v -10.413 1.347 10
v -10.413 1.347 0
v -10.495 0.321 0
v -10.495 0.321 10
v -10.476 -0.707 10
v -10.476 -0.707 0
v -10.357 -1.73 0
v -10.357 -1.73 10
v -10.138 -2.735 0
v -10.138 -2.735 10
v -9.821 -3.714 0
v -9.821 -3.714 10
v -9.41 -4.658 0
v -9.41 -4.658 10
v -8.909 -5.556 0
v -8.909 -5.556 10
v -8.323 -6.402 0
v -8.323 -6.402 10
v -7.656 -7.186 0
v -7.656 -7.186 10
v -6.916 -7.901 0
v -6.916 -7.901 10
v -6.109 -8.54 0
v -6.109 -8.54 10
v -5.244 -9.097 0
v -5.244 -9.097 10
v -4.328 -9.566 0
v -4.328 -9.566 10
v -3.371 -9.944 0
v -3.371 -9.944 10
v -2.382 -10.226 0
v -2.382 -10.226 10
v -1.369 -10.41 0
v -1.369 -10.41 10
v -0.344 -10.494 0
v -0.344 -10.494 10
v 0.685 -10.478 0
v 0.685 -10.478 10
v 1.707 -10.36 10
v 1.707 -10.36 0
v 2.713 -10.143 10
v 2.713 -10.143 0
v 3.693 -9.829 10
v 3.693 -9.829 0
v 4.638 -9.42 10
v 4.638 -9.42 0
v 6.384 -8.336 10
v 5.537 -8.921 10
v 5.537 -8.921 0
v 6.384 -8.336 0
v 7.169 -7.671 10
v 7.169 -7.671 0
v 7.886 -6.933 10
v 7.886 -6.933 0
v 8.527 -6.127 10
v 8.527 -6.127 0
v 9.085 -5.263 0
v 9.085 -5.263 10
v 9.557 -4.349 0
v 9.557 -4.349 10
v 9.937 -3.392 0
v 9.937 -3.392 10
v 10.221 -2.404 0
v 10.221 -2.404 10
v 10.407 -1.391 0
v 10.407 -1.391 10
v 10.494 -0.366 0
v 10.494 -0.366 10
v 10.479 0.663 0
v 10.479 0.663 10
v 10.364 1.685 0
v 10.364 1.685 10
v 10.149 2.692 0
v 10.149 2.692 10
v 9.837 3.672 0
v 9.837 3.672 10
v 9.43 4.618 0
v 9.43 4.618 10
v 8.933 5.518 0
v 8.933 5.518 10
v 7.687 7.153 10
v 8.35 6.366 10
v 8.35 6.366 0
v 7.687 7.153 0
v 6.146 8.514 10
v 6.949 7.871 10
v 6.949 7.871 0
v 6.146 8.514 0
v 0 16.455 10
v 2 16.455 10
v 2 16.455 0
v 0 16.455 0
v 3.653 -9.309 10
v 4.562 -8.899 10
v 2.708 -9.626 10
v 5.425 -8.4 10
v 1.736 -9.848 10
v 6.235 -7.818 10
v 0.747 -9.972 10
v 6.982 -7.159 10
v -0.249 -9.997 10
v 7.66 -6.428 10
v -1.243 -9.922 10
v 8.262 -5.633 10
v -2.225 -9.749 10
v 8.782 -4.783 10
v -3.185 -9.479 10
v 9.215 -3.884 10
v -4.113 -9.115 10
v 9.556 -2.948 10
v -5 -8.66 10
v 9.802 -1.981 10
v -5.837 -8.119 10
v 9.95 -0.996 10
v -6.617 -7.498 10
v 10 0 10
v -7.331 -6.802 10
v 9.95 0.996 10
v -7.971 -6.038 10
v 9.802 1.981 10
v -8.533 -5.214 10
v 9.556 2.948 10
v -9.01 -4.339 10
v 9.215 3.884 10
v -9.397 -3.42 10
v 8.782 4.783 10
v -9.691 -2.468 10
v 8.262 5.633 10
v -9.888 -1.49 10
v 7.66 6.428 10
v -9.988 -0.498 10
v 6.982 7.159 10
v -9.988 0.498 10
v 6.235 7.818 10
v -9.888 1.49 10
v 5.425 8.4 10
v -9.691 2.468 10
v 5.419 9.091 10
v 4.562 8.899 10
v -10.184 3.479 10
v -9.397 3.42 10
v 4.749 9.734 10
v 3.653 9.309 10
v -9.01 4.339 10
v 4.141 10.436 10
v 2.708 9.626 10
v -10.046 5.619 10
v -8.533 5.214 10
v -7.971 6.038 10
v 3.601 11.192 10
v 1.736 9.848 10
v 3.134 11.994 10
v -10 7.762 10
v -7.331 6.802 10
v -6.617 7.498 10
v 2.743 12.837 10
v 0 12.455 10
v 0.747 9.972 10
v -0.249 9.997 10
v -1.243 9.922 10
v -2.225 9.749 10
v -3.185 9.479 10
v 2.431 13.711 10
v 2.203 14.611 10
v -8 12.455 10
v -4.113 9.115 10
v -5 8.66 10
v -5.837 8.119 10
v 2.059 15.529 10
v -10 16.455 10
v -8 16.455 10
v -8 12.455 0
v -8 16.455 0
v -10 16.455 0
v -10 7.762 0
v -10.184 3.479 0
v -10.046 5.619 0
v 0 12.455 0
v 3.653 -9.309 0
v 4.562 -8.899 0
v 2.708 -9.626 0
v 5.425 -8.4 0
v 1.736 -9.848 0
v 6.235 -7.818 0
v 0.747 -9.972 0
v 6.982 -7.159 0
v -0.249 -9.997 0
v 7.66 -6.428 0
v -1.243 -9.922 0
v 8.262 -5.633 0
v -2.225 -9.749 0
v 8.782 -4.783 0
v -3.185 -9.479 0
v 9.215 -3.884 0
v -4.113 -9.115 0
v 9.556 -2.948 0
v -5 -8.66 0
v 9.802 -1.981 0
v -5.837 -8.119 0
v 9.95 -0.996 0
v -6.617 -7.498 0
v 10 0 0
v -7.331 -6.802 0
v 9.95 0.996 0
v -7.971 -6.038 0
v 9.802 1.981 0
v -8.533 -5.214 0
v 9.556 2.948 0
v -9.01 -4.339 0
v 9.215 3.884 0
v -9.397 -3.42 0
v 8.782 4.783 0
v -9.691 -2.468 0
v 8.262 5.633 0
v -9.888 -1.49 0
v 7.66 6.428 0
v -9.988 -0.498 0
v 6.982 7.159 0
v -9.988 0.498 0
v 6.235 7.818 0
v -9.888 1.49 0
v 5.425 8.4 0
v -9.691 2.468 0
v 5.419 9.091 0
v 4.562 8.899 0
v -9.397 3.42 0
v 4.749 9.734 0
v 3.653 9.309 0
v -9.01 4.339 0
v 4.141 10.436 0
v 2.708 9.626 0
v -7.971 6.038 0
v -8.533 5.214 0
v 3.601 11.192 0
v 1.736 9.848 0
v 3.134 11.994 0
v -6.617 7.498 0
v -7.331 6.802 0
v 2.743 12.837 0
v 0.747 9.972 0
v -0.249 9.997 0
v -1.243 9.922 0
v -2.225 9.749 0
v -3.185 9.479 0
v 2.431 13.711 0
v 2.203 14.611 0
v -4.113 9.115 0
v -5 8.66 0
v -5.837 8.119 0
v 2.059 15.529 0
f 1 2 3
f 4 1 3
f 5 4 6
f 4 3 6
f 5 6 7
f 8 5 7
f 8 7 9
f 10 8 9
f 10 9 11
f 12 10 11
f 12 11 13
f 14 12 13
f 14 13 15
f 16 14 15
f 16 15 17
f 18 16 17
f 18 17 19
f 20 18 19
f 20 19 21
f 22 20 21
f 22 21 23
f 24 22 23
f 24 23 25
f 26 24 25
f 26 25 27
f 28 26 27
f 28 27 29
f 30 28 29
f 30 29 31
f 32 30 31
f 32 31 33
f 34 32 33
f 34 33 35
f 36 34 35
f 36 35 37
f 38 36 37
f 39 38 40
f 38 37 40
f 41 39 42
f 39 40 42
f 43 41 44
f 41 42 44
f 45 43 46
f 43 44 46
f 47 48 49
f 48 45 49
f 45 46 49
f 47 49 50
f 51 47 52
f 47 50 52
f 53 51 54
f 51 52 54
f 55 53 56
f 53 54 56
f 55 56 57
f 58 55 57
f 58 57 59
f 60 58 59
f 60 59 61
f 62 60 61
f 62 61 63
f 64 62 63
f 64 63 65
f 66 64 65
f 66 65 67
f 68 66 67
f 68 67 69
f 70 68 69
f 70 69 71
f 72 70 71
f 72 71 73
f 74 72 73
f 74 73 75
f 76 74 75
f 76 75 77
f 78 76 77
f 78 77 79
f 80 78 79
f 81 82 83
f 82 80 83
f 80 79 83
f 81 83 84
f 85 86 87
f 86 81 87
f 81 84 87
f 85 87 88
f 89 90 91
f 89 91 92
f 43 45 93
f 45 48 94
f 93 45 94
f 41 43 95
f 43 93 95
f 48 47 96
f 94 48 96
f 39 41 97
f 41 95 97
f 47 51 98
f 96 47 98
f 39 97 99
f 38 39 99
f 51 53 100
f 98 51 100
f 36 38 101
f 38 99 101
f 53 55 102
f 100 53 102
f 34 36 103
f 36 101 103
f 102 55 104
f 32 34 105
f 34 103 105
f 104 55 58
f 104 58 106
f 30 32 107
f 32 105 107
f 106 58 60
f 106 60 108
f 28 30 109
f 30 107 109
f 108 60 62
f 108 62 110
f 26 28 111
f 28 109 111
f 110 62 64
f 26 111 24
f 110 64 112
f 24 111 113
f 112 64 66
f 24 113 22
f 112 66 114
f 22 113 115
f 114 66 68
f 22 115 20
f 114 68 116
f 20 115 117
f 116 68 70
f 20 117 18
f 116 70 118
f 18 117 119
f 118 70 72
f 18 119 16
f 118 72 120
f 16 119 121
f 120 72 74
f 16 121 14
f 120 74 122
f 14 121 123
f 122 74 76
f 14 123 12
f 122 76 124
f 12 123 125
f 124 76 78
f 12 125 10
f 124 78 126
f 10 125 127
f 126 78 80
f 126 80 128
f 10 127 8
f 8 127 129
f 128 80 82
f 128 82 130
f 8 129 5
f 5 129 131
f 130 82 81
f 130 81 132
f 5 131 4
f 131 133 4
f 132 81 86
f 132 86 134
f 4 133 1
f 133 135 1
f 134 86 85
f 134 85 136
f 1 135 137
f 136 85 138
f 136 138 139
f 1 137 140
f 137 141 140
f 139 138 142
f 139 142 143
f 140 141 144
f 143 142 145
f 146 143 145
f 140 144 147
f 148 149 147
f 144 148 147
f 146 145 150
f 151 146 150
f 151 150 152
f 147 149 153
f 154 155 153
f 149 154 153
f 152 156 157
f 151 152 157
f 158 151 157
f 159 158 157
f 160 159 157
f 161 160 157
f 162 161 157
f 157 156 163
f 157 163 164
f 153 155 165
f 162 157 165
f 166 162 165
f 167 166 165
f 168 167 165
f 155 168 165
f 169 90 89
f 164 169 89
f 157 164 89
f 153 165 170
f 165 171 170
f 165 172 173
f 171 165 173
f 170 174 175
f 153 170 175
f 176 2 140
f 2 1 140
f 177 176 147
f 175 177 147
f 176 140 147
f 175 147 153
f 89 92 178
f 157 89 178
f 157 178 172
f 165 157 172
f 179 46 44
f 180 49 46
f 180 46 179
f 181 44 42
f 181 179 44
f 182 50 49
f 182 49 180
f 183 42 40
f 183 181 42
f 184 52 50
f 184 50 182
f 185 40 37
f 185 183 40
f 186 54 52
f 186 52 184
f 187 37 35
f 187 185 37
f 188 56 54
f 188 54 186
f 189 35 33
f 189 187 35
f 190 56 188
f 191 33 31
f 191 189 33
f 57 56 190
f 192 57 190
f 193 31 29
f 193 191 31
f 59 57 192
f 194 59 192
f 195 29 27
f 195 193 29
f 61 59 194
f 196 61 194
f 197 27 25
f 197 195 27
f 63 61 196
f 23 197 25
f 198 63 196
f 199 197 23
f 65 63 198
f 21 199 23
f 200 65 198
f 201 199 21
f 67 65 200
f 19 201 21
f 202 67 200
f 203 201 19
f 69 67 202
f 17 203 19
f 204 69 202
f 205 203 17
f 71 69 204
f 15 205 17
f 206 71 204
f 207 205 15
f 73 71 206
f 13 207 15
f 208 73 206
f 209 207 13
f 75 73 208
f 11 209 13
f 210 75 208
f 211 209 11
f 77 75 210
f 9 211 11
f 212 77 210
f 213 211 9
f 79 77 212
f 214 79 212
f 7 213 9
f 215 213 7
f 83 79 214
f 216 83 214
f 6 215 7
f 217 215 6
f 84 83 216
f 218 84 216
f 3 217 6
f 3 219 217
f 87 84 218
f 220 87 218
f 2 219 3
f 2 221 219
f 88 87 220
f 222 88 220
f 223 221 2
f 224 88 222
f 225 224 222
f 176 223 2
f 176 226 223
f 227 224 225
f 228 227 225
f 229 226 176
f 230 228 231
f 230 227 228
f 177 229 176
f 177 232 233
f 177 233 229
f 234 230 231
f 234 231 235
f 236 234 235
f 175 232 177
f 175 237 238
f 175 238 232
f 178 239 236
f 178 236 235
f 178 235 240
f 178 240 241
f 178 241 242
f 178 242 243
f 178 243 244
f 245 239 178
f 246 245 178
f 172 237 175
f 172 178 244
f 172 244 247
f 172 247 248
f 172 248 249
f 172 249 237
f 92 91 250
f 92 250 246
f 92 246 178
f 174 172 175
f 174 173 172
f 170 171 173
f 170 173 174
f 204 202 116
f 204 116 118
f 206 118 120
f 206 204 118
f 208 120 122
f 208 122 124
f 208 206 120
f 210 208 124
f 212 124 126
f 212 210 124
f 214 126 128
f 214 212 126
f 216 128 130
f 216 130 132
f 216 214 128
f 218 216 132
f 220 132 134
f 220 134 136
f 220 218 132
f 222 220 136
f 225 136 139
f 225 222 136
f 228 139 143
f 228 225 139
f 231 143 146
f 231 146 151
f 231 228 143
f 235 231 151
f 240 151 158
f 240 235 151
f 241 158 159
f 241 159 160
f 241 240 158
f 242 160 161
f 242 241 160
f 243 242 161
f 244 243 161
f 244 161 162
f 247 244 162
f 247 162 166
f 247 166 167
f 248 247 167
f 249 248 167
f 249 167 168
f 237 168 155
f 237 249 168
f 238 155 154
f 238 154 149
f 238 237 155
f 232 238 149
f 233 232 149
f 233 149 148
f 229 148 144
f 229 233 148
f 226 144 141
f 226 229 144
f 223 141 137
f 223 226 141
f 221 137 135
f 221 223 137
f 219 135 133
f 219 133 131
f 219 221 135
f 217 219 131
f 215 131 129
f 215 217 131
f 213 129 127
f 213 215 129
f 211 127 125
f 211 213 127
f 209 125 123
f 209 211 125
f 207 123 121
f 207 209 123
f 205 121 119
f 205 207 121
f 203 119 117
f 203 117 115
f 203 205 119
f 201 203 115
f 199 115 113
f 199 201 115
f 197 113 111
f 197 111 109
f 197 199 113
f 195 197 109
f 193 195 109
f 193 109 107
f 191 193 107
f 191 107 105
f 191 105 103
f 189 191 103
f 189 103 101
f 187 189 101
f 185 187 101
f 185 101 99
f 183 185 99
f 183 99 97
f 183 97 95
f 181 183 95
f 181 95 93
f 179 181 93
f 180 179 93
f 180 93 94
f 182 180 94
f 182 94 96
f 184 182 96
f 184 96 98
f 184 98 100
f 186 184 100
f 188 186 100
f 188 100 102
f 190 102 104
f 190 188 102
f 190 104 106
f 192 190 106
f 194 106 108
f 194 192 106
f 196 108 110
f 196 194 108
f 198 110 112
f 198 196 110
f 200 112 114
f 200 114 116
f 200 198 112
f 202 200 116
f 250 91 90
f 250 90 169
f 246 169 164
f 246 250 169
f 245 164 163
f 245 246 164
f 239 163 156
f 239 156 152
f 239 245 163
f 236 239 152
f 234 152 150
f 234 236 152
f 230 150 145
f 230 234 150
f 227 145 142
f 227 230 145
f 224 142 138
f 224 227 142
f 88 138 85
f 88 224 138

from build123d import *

# Parameters (mm, degrees)
SKETCH1_R           = 10.5
SKETCH1_R_2         = 10
BOSS_EXTRUDE1_DEPTH = 10
FILLET1_R           = 50
FILLET2_R           = 10


with BuildPart() as part:
    # Sketch1 → Boss-Extrude1 (new body)
    # profile 1 of 2: a face of its own
    with BuildSketch(Plane.XY):
        with BuildLine():
            Line((-8, 16.455448816), (-10, 16.455448816))
            Line((-10, 16.455448816), (-10, 3.201562119))
            ThreePointArc((-10, 3.201562119), (-5.350189391, 9.034681703), (2, 10.307764064))
            Line((2, 10.307764064), (2, 16.455448816))
            Line((2, 16.455448816), (0, 16.455448816))
            Line((0, 16.455448816), (0, 12.455448816))
            Line((0, 12.455448816), (-8, 12.455448816))
            Line((-8, 12.455448816), (-8, 16.455448816))
        make_face()
    # profile 2 of 2: a face of its own
    with BuildSketch(Plane.XY):
        Circle(SKETCH1_R)
        Circle(SKETCH1_R_2, mode=Mode.SUBTRACT)
    extrude(amount=BOSS_EXTRUDE1_DEPTH)

    # Fillet1
    fillet1_edges = [part.edges().sort_by_distance(p)[0] for p in [
        (-10, 3.201562119, 5),
    ]]
    fillet(fillet1_edges, radius=FILLET1_R)

    # Fillet2
    # the kernel refuses this fillet: 10 mm, written as the material it adds along each edge
    with BuildSketch(Plane(origin=(2, 10.307764064, 0), x_dir=(0.9177385180752605, -0.3971851110515409, 0), z_dir=(0, 0, 1))) as fillet2_piece_1:
        with BuildLine():
            CenterArc((6.668287117, 9.765906989), FILLET2_R, 204.355310462, 53.22294126)
            Line((-2.441768851, 5.641967094), (-2.62396997, 5.559488296))
            ThreePointArc((-2.62396997, 5.559488296), (-1.404432129, 2.741546525), (-0.183547704, -0.079437022))
            Line((-0.183547704, -0.079437022), (0.043021207, -0.19531814))
            ThreePointArc((0.043021207, -0.19531814), (2.258613378, 0.045797661), (4.474205549, -0.19531814))
            Line((4.474205549, -0.19531814), (4.517226757, 0))
        make_face()
    extrude(amount=10)


solid = part.part
